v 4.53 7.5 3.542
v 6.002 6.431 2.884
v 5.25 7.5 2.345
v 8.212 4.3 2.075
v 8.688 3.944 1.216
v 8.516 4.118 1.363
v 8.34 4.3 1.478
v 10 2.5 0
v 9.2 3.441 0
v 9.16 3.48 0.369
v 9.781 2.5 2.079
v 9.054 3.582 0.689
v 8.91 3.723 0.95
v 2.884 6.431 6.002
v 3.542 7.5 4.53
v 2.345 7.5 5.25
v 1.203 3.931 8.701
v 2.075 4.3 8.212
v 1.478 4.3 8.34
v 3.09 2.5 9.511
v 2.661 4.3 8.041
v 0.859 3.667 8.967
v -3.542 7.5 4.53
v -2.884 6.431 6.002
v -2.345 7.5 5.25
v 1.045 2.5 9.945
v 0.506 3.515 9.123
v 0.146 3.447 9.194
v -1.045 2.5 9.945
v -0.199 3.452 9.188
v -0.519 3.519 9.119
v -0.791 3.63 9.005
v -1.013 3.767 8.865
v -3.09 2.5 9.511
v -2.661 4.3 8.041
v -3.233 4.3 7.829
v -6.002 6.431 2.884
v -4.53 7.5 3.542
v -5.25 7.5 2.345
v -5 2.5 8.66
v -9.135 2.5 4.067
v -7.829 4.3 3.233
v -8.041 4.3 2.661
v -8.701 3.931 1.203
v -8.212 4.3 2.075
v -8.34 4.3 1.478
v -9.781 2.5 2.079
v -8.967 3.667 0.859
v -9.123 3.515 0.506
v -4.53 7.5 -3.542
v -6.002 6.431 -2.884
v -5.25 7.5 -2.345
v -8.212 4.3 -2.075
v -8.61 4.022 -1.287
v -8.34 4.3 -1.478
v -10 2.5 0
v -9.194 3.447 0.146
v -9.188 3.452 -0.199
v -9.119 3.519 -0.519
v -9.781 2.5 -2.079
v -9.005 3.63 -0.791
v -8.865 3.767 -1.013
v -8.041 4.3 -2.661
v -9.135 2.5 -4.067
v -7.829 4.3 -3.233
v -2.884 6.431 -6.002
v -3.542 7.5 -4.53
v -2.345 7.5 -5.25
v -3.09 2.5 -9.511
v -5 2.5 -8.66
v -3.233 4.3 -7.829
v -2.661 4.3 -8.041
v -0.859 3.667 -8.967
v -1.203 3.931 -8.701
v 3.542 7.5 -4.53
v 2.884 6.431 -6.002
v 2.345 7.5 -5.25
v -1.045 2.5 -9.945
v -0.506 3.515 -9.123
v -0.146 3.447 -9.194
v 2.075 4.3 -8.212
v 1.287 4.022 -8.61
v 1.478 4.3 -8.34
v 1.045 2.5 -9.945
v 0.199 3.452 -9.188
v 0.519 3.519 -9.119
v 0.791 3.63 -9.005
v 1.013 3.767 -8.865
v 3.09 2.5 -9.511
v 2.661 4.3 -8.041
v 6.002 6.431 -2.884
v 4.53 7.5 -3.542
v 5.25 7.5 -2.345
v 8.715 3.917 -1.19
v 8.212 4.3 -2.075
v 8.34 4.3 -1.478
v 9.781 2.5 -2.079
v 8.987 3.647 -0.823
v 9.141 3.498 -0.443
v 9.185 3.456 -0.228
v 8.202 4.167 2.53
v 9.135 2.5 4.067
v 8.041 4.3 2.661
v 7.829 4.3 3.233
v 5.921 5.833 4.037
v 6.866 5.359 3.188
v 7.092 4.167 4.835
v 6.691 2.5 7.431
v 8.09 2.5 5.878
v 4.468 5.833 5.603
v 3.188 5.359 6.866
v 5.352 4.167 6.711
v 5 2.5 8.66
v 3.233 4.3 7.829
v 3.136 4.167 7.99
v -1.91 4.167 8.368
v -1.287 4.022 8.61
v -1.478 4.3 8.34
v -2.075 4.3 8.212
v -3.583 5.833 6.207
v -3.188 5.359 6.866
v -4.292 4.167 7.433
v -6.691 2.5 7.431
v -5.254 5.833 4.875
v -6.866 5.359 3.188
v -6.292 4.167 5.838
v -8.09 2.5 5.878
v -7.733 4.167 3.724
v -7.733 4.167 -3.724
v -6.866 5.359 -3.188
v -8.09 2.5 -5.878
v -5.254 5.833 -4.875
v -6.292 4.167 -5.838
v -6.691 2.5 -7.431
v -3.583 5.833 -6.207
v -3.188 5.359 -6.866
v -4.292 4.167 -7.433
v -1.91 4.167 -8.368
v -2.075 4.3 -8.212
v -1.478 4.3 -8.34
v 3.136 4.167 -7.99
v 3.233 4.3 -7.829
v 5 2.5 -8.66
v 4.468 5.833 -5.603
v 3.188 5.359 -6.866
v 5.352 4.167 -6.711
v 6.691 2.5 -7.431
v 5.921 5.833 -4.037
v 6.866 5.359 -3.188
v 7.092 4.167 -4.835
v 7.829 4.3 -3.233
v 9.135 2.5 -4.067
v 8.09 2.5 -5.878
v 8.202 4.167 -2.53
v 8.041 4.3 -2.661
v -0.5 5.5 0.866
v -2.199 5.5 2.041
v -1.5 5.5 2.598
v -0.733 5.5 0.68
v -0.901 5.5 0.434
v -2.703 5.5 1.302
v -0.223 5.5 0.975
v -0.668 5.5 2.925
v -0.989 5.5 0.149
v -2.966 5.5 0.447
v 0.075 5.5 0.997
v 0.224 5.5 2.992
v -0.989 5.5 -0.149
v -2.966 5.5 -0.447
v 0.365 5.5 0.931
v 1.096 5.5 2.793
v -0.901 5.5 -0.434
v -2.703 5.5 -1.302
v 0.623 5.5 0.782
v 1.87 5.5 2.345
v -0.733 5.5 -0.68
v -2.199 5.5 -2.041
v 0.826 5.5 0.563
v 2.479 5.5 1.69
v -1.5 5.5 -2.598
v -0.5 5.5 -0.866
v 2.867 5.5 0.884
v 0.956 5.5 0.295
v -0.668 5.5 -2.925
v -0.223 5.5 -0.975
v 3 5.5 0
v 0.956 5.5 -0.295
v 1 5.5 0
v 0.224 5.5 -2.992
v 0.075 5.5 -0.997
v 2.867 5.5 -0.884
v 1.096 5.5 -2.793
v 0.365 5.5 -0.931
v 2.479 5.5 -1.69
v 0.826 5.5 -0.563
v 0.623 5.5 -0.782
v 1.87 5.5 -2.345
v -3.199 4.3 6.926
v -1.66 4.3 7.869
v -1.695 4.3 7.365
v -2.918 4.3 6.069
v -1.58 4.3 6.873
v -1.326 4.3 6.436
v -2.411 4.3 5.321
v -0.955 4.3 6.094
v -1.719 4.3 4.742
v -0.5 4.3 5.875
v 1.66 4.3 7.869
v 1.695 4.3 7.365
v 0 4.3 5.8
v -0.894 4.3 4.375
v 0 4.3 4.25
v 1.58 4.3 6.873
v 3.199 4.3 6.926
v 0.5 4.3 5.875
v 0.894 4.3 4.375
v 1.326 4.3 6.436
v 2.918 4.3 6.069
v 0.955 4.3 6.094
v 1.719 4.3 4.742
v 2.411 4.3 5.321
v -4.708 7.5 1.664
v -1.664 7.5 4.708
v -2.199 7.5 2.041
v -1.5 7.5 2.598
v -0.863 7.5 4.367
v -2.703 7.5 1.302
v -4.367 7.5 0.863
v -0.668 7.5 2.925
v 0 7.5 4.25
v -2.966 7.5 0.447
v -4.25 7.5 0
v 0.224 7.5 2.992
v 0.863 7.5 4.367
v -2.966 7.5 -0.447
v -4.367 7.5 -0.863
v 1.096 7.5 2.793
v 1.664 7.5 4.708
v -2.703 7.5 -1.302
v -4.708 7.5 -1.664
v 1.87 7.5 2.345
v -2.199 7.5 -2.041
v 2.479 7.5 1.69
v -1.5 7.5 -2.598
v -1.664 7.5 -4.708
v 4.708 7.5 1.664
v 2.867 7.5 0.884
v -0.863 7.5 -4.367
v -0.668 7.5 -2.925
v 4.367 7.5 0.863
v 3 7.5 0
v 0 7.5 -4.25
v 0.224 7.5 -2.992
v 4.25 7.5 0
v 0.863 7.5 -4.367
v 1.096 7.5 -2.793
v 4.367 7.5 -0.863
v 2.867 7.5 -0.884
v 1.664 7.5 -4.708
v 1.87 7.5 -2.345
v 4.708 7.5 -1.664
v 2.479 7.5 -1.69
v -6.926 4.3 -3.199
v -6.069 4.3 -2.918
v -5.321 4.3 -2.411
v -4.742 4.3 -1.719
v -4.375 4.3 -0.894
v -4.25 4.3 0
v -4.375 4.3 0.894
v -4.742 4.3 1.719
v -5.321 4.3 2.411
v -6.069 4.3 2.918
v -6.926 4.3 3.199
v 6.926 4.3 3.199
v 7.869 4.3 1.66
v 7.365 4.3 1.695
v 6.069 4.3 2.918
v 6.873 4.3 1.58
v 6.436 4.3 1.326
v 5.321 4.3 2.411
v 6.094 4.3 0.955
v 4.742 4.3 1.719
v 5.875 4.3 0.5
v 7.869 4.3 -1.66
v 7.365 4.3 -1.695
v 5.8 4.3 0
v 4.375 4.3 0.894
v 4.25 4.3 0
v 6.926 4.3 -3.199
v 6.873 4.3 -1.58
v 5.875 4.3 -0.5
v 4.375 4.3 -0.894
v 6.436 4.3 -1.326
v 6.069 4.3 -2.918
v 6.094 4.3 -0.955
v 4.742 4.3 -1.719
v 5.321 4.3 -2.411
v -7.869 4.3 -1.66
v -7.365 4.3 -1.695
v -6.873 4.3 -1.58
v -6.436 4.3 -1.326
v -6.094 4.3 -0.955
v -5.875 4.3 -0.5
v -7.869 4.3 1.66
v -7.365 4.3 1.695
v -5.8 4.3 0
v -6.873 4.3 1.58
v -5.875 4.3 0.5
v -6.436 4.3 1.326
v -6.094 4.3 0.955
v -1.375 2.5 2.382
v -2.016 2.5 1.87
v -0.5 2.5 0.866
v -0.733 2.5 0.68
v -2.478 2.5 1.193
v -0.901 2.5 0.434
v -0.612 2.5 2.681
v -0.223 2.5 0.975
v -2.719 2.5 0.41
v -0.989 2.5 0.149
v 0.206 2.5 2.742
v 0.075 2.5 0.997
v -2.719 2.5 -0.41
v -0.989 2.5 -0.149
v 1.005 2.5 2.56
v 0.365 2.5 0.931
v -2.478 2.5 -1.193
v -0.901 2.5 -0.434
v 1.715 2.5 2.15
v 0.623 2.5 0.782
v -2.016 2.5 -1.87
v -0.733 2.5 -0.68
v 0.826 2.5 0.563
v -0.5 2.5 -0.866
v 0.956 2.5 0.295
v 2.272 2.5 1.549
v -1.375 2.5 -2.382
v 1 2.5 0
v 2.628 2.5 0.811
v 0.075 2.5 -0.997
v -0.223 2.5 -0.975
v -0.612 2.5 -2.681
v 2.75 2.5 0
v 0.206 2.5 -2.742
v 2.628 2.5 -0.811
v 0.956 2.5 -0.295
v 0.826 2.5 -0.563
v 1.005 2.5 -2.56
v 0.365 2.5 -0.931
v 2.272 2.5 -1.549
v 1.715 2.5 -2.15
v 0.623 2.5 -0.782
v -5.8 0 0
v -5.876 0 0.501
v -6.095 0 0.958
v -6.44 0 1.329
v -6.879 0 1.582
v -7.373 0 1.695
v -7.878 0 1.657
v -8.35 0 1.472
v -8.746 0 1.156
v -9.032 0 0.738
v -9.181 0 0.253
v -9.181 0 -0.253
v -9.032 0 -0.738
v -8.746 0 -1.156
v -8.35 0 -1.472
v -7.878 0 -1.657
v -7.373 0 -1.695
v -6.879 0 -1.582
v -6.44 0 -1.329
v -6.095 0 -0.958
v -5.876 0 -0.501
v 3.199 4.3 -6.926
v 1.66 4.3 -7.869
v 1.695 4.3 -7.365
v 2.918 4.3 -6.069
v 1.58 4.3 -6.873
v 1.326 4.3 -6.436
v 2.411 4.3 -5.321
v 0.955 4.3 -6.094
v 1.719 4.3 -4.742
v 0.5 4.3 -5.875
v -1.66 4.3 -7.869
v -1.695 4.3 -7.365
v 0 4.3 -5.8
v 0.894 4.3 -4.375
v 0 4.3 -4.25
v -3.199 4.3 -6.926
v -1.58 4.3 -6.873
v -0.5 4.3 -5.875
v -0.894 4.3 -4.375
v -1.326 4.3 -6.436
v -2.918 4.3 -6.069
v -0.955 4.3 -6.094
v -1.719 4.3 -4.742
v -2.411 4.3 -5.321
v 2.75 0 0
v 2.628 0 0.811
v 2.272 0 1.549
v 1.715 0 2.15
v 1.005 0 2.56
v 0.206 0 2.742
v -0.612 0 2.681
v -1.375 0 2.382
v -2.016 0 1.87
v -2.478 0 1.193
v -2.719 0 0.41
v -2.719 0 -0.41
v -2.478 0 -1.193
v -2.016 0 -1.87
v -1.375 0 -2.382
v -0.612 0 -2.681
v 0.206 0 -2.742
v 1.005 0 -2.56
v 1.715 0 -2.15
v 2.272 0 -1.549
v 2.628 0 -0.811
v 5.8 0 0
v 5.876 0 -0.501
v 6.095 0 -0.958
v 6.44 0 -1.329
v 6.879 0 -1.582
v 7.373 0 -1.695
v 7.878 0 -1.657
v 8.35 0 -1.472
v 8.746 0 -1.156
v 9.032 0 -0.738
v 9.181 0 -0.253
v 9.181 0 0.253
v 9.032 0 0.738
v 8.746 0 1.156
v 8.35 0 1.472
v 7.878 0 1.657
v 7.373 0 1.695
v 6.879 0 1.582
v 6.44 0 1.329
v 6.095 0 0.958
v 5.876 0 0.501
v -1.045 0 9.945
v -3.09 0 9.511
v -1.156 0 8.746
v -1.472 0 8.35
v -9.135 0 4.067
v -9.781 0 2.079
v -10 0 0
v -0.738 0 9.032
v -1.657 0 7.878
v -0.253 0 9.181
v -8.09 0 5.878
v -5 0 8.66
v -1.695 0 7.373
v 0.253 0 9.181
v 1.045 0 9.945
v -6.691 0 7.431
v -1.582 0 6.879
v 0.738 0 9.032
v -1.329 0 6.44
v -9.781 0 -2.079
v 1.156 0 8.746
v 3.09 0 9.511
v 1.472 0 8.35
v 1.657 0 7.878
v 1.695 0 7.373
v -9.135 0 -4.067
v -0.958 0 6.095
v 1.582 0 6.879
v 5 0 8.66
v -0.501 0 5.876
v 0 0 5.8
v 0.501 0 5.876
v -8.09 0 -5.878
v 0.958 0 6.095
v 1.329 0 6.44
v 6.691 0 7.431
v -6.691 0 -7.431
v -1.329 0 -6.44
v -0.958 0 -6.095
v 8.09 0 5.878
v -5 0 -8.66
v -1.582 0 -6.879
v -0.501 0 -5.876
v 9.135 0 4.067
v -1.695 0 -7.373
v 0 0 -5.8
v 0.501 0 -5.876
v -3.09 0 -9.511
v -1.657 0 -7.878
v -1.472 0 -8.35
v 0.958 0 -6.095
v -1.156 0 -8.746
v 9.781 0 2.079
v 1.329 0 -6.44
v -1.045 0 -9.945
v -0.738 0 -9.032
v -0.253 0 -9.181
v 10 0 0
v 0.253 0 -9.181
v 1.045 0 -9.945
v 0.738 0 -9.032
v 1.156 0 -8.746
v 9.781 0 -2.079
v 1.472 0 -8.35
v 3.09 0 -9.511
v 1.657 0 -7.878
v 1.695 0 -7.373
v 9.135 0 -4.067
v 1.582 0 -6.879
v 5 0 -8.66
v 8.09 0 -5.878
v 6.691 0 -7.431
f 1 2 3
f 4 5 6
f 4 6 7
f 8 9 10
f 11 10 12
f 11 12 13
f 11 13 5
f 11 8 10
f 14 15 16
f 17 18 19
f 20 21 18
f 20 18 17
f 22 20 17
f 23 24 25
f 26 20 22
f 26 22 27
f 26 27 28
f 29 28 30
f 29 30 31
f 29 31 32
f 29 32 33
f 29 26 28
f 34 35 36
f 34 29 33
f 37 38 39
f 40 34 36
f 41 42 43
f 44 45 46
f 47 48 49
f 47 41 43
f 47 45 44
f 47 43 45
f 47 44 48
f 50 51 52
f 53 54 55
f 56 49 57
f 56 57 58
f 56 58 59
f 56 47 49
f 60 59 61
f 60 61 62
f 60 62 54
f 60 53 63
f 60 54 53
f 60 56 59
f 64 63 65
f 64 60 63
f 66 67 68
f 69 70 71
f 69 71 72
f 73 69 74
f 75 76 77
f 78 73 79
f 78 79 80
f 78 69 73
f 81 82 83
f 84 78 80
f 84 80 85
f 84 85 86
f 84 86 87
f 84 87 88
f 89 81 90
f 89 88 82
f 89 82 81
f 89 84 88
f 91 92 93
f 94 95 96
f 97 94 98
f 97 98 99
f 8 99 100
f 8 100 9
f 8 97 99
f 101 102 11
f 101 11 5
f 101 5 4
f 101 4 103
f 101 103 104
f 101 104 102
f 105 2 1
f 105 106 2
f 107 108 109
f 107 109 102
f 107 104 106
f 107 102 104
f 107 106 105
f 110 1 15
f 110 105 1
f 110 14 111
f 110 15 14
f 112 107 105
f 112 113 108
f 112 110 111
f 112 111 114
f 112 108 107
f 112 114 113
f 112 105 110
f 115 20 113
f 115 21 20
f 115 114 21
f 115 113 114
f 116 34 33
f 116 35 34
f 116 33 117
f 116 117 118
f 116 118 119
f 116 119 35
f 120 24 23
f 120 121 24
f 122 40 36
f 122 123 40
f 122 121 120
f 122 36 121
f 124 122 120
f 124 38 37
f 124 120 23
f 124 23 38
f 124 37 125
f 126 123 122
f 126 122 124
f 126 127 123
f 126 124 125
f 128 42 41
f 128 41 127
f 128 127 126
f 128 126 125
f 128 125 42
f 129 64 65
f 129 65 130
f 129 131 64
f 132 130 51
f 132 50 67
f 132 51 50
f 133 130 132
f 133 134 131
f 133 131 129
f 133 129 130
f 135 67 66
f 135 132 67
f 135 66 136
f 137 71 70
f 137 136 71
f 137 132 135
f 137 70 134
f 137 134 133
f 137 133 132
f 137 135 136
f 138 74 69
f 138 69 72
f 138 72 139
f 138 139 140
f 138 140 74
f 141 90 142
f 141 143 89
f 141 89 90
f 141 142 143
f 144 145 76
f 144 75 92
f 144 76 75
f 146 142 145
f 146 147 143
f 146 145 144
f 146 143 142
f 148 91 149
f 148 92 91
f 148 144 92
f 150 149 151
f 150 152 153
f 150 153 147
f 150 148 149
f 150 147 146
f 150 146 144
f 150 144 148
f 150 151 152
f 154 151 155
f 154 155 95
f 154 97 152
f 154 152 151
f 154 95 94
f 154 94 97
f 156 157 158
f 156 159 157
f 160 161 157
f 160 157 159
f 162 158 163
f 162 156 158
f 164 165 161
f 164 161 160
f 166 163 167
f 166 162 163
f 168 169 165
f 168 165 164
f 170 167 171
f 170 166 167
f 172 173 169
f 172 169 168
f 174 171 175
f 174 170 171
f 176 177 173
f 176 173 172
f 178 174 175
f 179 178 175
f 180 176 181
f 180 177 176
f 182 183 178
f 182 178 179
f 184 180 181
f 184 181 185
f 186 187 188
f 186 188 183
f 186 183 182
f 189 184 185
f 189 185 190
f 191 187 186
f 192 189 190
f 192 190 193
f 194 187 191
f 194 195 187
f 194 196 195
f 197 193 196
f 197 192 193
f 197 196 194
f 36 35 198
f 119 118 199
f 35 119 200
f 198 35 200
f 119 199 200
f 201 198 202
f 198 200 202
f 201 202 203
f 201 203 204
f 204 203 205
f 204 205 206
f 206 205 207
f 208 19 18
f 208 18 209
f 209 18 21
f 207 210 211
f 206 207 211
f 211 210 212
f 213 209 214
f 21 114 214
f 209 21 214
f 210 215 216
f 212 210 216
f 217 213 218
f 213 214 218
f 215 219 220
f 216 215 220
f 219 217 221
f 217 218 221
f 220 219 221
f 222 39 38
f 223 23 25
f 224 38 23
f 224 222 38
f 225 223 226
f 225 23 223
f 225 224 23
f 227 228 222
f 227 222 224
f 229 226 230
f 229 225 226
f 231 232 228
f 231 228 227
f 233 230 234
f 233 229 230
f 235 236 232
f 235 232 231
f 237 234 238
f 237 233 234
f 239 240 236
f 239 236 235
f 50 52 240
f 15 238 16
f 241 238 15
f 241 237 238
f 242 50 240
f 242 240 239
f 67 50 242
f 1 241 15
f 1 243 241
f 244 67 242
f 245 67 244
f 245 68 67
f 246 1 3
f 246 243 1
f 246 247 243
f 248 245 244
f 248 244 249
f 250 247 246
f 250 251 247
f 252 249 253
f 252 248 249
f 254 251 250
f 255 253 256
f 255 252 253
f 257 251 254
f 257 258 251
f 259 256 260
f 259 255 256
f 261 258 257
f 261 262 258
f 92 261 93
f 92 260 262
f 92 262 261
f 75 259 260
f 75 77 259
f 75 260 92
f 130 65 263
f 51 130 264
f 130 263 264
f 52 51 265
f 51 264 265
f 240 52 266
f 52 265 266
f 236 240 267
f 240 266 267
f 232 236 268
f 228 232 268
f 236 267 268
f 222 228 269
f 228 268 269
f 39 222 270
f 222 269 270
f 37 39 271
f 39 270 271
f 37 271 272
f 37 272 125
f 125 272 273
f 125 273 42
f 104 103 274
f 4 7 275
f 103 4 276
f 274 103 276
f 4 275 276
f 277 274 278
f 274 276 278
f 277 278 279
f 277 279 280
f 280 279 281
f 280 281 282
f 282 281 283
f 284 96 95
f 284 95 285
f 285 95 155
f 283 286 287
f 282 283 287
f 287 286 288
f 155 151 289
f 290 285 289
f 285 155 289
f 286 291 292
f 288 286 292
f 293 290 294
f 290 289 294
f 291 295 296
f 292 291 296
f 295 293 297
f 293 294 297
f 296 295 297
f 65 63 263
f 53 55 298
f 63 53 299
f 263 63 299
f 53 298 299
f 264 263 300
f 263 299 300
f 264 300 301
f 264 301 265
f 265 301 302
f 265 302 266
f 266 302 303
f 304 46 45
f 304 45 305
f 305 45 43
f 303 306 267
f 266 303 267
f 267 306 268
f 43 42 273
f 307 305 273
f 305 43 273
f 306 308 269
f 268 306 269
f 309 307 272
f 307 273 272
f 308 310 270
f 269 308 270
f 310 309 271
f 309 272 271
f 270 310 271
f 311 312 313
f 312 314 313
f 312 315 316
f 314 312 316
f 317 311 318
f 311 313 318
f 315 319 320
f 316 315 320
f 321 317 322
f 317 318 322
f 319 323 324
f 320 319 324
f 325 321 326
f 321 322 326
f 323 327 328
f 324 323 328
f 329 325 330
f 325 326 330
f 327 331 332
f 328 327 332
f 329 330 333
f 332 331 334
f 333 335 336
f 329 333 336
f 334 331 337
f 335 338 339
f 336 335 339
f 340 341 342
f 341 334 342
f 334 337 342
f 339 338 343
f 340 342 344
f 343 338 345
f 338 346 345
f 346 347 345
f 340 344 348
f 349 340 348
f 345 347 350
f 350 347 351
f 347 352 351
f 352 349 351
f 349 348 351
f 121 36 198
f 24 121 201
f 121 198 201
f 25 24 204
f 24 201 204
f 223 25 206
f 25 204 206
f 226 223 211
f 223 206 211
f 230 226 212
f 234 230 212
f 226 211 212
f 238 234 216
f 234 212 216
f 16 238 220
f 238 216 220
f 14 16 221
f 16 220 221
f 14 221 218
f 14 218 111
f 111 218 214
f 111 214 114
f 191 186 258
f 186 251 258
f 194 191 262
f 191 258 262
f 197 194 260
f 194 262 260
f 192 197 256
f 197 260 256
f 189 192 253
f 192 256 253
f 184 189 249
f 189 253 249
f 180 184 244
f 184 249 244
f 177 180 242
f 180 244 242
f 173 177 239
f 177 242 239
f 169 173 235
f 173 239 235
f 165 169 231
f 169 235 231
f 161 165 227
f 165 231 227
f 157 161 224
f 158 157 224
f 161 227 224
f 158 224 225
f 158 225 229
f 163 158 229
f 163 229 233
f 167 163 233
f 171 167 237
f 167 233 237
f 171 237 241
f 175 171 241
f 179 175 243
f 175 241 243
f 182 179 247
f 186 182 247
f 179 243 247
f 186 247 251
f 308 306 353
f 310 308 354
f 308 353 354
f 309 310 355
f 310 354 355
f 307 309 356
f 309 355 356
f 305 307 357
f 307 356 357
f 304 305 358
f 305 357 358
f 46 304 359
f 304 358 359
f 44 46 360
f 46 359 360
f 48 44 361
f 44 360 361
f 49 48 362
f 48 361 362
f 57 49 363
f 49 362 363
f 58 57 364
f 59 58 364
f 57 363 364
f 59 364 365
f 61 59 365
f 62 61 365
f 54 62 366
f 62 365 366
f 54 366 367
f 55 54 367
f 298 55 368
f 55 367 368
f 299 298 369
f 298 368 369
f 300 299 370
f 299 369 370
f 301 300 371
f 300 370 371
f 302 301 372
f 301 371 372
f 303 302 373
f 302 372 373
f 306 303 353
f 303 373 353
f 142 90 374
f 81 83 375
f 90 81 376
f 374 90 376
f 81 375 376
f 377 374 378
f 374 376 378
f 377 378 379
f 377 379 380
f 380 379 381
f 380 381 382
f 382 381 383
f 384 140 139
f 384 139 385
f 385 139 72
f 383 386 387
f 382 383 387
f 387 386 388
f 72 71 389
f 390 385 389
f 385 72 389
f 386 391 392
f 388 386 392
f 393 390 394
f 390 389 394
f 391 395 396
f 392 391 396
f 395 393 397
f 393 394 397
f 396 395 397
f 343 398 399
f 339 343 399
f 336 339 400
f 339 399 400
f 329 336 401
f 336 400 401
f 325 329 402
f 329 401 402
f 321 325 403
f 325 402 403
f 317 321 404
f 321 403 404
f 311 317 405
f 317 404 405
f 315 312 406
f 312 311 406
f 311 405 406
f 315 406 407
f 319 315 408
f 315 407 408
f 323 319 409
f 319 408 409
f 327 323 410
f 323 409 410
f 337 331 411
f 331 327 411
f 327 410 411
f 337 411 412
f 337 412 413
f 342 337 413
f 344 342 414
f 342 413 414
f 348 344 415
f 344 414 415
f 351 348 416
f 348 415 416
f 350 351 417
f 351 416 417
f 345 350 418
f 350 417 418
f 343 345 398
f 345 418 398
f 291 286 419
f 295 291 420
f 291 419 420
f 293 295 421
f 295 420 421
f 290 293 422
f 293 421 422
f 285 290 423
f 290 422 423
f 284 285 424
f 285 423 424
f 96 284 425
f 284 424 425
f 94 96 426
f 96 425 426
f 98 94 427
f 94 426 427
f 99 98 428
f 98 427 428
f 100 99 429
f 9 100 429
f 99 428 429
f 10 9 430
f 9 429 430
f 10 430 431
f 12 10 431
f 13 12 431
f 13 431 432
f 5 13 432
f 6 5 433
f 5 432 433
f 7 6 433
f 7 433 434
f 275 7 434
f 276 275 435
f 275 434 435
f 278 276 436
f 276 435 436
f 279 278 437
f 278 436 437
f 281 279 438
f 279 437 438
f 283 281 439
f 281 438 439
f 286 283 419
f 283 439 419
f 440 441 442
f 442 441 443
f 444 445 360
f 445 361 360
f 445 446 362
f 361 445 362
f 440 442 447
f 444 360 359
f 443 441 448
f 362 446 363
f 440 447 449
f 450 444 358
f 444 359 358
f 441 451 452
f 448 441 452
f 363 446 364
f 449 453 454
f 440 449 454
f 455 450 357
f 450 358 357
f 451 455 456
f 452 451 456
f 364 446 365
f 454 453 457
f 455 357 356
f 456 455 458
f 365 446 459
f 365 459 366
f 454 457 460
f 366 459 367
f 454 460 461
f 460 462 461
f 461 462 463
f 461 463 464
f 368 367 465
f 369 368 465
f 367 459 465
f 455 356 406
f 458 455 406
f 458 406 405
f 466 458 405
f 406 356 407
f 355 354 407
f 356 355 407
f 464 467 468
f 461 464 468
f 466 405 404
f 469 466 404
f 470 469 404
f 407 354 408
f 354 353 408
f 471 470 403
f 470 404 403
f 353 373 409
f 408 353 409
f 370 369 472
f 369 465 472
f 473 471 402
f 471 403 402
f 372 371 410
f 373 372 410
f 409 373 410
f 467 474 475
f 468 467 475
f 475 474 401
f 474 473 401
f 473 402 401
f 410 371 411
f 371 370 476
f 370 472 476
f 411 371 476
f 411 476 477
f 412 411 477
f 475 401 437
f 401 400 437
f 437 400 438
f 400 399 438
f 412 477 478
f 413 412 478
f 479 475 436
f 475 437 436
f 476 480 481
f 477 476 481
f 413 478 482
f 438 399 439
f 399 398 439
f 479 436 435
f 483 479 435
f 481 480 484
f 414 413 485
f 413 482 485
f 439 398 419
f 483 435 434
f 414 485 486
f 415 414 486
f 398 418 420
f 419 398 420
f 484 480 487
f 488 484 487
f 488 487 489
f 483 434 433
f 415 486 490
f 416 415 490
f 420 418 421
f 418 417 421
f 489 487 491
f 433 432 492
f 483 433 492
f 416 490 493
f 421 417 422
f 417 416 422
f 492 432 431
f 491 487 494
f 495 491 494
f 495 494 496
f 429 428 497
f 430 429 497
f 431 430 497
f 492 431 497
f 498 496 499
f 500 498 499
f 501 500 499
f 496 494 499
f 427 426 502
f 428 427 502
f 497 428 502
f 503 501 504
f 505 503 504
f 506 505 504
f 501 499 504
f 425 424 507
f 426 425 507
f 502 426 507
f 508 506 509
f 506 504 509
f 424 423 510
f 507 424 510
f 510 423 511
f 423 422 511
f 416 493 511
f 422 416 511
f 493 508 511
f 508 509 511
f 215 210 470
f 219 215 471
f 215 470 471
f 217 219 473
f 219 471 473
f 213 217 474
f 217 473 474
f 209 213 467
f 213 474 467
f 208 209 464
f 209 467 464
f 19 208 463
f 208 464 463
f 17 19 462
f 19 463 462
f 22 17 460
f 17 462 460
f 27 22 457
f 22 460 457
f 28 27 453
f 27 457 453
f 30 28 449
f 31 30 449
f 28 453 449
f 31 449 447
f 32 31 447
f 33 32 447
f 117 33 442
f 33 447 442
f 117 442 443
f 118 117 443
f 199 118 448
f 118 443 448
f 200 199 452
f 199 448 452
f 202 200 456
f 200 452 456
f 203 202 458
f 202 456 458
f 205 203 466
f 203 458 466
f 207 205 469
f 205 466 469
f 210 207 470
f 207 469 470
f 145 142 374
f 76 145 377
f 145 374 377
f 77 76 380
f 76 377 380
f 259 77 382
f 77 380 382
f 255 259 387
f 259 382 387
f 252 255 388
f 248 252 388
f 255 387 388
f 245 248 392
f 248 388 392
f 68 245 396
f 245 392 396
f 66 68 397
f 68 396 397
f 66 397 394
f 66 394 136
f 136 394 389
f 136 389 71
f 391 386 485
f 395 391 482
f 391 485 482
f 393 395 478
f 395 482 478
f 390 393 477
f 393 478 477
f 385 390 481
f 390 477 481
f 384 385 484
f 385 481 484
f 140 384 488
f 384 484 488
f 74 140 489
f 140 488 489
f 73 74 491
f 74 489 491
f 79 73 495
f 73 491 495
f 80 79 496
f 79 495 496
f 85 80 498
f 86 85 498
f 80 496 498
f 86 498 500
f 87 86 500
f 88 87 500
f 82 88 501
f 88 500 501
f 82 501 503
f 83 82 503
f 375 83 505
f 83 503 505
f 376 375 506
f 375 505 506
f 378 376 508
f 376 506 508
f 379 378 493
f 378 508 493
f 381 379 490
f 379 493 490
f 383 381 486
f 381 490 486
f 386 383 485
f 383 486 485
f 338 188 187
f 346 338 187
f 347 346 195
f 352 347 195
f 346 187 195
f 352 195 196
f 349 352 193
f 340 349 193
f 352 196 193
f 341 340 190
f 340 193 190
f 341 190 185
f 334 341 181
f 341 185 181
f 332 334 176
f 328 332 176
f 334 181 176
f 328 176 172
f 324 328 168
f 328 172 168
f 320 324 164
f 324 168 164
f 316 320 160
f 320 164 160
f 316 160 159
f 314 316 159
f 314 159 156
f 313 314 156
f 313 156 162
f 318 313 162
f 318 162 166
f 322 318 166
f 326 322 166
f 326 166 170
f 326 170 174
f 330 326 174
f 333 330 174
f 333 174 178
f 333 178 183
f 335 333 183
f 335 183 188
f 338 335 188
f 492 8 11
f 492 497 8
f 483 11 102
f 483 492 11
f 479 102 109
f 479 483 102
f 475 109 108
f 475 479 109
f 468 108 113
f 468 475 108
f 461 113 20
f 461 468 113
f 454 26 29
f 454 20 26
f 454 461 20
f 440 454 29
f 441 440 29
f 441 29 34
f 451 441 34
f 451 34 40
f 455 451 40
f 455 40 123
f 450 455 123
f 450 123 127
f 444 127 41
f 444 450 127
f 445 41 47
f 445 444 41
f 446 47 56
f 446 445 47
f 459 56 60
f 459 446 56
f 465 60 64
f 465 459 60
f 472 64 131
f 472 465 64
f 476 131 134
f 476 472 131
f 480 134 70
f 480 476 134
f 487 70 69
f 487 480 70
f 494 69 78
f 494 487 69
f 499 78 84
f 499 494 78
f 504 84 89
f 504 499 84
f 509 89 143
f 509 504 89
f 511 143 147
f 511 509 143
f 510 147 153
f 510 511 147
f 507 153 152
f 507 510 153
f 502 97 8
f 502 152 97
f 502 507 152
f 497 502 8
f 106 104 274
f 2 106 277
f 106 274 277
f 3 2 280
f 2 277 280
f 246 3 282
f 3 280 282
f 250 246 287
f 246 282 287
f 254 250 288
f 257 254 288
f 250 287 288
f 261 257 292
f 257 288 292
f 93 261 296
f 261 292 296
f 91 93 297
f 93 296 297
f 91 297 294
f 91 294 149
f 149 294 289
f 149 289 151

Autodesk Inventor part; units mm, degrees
ref_plane "YZ Plane" through (0, 0, 0) normal (1, 0, 0) x (0, 1, 0)
ref_plane "XZ Plane" through (0, 0, 0) normal (0, 1, 0) x (-1, 0, 0)
ref_plane "XY Plane" through (0, 0, 0) normal (0, 0, 1) x (1, 0, 0)
sketch "Sketch2" plane through (0, 0, 0) normal (0, 0, 1) x (1, 0, 0)
  line L0 (1, 2.5) -> (1, 5.5)
  line L1 (1, 5.5) -> (3, 5.5)
  line L2 (3, 5.5) -> (3, 7.5)
  line L3 (3, 7.5) -> (5.75, 7.5)
  line L4 (5.75, 7.5) -> (10, 2.5)
  line L5 (10, 2.5) -> (10, 0)
  line L6 (1, 2.5) -> (2.75, 2.5)
  line L7 (2.75, 2.5) -> (2.75, 0)
  line L8 (2.75, 0) -> (10, 0)
  line L9 (0, 0) -> (0, 19.425)
  dimension "d0" = 6
  dimension "d1" = 2
  dimension "d2" = 5.5
  dimension "d3" = 20
  dimension "d4" = 2.5
  dimension "d5" = 3
  dimension "d6" = 2
  dimension "d19" = 11.5
revolve "Revolution1" add sketch "Sketch2" angle 360 about axis through (0, 0, 0) along (0, 1, 0)
sketch "Sketch3" plane through (0, 7.5, 0) normal (0, 1, 0) x (1, 0, 0)
  point P0 (0, 0)
  point P1 (0, 7.5)
  dimension "d8" = 7.5
hole "Hole1" at (0, 7.5, -7.5) direction (0, -1, 0) diameter 3.4 end through all counterbore diameter 6.5 counterbore depth 3.2 clearance for "Socket Head Cap Screw DIN EN ISO 4762" size "M3" standard "DIN"
pattern_circular "Circular Pattern1" count 4 over 360 about axis through (0, -10, 0) along (0, 1, 0) of "Hole1"
properties part number "902-4250 magnet hold"
